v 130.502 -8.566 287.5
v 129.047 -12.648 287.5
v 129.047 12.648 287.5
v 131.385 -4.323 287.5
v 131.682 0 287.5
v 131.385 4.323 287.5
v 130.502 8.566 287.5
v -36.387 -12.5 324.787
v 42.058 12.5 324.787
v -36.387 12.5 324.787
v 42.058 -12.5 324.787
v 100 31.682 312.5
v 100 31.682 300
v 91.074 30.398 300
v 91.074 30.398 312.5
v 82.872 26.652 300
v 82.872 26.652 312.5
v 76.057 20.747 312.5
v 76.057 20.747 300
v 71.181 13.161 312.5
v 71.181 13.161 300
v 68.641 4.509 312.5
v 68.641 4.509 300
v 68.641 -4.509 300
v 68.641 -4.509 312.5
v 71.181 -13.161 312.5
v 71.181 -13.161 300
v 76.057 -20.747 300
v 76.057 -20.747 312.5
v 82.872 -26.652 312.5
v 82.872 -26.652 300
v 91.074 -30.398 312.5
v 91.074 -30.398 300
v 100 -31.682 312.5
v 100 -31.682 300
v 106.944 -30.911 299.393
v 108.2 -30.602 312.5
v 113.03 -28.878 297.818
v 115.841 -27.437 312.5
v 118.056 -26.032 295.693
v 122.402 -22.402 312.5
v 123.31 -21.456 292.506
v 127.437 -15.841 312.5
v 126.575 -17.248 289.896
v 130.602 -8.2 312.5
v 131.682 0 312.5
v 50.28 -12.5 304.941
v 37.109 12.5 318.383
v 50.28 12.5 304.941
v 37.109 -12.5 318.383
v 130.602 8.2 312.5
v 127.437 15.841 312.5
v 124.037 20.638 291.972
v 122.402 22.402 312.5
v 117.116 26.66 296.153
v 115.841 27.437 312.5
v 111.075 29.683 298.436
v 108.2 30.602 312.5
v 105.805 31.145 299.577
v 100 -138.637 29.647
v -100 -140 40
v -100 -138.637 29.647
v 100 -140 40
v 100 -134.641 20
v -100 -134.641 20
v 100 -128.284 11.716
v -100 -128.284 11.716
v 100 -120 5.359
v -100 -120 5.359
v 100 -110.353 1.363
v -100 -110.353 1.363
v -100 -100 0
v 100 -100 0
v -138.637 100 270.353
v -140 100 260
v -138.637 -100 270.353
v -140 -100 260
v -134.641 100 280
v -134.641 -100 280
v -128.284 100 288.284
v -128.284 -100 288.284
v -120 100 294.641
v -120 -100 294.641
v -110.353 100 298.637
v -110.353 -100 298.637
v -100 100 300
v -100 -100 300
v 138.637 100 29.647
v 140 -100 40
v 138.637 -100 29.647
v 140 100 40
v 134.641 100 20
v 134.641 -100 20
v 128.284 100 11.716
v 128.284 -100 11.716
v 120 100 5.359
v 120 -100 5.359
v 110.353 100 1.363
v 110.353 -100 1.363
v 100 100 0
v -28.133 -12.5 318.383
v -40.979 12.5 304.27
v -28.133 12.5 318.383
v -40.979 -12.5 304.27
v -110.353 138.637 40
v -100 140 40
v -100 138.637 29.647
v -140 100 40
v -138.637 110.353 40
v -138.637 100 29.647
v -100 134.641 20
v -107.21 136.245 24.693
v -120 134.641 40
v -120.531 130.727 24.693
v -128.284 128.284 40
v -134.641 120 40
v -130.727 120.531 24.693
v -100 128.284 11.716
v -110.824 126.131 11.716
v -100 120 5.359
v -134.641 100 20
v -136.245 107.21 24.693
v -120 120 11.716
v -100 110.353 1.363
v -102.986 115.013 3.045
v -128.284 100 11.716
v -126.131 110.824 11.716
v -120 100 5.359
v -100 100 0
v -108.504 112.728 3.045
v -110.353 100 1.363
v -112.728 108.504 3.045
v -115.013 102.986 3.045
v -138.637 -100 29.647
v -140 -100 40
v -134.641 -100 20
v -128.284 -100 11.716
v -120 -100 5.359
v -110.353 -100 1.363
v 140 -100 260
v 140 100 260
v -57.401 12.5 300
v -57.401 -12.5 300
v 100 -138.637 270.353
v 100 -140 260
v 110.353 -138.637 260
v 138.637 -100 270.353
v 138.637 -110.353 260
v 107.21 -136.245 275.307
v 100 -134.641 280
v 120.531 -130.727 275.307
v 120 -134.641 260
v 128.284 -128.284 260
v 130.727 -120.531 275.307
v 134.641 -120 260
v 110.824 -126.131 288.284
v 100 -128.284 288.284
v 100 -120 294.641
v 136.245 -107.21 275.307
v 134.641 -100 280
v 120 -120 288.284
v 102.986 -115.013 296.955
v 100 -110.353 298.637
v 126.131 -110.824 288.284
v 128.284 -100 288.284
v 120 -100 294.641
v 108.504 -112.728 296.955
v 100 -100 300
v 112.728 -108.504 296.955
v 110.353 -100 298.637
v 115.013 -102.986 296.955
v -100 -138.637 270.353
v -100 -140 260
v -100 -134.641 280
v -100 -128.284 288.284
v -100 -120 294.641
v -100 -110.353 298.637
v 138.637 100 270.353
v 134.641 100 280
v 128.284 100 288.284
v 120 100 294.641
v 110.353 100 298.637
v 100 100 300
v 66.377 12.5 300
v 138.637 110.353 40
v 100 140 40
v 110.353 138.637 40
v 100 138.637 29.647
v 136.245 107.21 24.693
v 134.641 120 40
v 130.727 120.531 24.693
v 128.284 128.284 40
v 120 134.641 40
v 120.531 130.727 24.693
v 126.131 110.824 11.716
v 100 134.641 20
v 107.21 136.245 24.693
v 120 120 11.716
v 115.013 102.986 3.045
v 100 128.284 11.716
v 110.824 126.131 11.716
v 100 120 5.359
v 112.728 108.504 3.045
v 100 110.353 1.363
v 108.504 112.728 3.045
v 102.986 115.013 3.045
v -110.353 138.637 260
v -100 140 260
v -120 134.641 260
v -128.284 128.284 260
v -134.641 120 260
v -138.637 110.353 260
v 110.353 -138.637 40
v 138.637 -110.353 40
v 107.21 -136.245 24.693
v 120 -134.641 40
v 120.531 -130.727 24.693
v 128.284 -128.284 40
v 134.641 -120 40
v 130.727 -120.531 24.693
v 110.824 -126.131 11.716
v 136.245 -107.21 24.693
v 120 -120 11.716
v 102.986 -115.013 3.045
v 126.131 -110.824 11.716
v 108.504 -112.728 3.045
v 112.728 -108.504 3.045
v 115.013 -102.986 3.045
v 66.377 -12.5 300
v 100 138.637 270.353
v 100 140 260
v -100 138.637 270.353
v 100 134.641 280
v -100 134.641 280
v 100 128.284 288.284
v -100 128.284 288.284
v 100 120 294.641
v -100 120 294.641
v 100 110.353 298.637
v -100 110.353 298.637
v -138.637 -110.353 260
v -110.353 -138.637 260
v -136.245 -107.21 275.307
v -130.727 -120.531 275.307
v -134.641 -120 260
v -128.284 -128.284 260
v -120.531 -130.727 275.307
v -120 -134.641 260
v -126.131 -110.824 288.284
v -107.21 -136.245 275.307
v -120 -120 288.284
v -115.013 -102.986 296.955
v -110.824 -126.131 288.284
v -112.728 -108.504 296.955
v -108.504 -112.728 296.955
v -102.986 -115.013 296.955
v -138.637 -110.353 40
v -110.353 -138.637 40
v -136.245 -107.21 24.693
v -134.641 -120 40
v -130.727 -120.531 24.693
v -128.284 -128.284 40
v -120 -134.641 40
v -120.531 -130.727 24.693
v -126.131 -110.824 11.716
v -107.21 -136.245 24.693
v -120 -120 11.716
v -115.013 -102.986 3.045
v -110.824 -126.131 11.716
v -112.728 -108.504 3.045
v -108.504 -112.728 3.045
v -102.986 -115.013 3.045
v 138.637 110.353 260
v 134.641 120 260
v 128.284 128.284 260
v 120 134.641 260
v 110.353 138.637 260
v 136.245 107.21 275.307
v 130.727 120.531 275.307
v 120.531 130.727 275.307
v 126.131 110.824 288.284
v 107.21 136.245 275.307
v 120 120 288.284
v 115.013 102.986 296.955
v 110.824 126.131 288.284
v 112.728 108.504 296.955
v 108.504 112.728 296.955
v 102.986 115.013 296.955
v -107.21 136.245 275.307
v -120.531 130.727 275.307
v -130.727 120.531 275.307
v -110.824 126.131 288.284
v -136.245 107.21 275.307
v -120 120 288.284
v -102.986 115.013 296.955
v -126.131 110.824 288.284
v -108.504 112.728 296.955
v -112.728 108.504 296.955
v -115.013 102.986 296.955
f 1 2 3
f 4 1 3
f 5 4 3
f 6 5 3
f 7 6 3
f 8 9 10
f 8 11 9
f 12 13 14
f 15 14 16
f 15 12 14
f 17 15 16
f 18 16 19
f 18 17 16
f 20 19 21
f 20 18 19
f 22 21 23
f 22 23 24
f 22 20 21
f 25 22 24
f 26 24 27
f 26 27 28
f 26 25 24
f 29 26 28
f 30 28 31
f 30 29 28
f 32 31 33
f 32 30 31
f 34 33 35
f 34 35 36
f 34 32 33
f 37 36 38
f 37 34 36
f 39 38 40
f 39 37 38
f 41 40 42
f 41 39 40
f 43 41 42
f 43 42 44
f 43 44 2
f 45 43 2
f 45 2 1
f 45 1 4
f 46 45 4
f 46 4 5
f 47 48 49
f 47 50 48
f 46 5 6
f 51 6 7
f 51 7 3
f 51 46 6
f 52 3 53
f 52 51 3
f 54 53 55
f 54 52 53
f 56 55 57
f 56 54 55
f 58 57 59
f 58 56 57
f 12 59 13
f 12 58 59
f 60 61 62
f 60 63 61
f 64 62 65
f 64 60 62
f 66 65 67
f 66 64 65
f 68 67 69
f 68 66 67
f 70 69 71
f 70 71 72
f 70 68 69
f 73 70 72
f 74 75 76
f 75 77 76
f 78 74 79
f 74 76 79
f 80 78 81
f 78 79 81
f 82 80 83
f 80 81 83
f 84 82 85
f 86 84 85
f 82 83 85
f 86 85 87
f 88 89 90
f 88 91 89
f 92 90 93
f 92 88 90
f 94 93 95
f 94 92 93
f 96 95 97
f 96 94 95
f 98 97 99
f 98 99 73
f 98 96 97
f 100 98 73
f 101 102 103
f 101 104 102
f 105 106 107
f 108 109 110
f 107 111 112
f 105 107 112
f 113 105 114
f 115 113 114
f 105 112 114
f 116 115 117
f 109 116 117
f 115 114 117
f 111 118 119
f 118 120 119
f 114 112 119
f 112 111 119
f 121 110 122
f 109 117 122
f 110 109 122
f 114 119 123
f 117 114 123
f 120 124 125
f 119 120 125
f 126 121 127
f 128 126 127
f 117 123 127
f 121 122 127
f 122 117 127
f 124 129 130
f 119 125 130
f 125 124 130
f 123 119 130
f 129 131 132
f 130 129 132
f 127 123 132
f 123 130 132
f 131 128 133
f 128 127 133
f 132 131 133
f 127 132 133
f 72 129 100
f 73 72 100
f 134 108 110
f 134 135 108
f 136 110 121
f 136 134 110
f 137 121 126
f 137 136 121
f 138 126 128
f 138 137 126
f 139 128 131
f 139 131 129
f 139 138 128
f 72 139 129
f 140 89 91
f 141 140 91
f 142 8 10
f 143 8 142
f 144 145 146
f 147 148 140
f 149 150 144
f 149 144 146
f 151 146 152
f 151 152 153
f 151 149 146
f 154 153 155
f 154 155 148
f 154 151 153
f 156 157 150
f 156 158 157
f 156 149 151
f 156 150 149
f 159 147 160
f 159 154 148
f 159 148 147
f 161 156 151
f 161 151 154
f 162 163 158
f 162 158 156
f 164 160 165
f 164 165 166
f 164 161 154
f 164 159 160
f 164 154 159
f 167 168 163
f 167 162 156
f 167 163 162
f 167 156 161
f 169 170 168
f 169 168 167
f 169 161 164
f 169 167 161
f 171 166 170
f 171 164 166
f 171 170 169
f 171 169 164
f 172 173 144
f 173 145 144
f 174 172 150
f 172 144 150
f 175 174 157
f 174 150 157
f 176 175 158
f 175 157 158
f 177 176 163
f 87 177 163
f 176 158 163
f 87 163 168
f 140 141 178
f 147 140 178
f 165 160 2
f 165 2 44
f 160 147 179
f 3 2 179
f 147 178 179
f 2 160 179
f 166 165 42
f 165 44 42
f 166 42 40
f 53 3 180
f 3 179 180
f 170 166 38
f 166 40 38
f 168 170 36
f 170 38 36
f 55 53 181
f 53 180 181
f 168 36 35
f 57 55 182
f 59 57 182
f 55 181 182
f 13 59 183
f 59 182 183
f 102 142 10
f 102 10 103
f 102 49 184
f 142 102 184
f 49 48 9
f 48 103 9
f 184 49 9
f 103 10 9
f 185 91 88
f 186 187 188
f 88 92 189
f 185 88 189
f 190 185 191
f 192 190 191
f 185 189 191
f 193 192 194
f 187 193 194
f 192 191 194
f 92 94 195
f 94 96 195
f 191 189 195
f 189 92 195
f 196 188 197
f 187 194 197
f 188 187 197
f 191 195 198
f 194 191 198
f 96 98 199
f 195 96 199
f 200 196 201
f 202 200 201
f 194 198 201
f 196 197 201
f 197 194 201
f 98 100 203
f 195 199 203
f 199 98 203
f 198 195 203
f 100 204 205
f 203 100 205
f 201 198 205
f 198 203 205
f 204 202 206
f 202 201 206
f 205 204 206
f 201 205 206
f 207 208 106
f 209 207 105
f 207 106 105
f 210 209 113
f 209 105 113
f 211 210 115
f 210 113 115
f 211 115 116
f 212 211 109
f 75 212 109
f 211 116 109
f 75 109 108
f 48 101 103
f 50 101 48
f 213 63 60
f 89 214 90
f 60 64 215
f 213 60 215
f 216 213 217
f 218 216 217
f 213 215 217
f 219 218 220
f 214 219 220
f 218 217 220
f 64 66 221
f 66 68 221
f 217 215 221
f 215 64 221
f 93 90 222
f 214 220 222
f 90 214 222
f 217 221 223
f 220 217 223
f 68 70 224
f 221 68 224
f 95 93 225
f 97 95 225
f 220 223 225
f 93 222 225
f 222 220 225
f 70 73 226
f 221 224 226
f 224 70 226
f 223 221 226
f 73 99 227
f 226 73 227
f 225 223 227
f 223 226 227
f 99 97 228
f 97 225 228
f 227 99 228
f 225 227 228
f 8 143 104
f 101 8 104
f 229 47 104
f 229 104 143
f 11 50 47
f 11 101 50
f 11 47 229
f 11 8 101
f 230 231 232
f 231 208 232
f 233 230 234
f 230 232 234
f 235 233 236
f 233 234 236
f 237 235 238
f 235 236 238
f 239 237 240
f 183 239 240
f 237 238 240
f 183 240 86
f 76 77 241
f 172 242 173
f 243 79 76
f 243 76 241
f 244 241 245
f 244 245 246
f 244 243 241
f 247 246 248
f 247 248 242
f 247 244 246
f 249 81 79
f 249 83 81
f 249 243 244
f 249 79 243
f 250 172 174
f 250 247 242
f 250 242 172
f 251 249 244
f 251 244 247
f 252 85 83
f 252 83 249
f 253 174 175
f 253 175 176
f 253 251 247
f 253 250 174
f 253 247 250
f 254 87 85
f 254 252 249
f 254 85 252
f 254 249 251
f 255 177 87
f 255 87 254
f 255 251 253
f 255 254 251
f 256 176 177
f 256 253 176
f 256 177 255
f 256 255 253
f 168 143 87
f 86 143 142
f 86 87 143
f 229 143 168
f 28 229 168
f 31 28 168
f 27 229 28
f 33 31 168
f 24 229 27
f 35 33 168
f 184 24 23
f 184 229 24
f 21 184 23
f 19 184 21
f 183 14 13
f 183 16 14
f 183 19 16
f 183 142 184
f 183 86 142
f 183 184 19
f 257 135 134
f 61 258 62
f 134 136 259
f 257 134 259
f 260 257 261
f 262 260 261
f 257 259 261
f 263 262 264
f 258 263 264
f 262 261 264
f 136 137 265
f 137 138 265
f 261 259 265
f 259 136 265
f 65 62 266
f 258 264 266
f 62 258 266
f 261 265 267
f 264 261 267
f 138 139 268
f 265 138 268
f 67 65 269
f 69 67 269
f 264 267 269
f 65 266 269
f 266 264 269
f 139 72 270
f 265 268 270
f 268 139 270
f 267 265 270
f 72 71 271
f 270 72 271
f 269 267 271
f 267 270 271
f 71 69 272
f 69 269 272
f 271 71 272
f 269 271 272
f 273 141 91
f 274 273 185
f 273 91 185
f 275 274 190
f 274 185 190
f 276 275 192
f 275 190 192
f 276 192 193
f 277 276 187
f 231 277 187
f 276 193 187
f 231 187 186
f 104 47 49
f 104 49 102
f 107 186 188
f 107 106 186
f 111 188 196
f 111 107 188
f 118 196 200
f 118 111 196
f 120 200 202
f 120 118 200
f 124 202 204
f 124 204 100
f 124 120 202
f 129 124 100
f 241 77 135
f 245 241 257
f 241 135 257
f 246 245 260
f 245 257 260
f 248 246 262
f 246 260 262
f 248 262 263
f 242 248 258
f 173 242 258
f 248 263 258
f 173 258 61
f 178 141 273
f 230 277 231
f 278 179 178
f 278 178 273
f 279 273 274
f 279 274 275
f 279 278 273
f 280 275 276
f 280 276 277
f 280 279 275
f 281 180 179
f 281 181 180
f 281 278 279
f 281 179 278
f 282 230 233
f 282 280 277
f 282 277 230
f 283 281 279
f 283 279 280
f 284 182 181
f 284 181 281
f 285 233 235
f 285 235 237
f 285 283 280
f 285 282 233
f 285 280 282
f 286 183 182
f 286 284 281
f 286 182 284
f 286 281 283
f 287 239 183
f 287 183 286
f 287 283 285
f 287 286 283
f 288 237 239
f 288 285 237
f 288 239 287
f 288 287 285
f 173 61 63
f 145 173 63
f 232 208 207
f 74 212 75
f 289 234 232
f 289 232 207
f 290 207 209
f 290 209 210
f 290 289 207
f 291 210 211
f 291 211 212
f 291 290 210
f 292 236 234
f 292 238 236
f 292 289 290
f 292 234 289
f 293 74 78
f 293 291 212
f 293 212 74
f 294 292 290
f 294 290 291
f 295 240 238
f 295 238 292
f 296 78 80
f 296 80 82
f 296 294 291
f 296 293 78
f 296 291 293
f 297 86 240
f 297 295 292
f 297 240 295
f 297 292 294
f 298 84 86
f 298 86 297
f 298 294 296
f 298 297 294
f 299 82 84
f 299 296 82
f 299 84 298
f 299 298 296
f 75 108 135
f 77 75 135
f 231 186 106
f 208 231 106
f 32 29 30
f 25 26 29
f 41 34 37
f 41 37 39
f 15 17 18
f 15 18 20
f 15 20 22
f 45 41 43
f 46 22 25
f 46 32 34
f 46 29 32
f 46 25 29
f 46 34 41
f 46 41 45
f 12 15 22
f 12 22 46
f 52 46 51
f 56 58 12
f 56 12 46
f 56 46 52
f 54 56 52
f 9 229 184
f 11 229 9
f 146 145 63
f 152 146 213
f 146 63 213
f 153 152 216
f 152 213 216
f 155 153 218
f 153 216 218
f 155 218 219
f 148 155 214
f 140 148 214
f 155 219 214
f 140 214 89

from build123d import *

# Parameters (mm, degrees)
F1_DEPTH = 300
F2_R     = 40
F4_DEPTH = 12.5
F6_DEPTH = 12.5


with BuildPart() as f1:
    # F0 (on Top) → F1 (new body)
    with BuildSketch(Plane.XY):
        with BuildLine():
            ThreePointArc((140, 100), (128.2842712475, 128.2842712475), (100, 140))
            Line((100, 140), (-100, 140))
            ThreePointArc((-100, 140), (-128.2842712475, 128.2842712475), (-140, 100))
            Line((-140, 100), (-140, -100))
            ThreePointArc((-140, -100), (-128.2842712475, -128.2842712475), (-100, -140))
            Line((-100, -140), (100, -140))
            ThreePointArc((100, -140), (128.2842712475, -128.2842712475), (140, -100))
            Line((140, -100), (140, 100))
        make_face()
    extrude(amount=F1_DEPTH)

    # F2
    f2_edges = [f1.edges().sort_by_distance(p)[0] for p in [
        (128.284271, 128.284271, 300),
        (0, 140, 300),
        (-128.284271, 128.284271, 300),
        (-140, 0, 300),
        (-128.284271, -128.284271, 300),
        (0, -140, 300),
        (128.284271, -128.284271, 300),
        (140, 0, 300),
        (140, 0, 0),
    ]]
    fillet(f2_edges, radius=F2_R)

    # F3 (on face) → F4 (join, symmetric)
    with BuildSketch(Plane.XY.offset(300)):
        with BuildLine():
            ThreePointArc((100, -31.6815127242), (122.4022124856, -22.4022124855), (131.6815127242, 0))
            ThreePointArc((131.6815127242, 0), (122.4022124856, 22.4022124855), (100, 31.6815127242))
            Line((100, 31.6815127242), (100, -31.6815127242))
        make_face()
        with BuildLine():
            Line((100, -31.6815127242), (100, 31.6815127242))
            ThreePointArc((100, 31.6815127242), (68.3184872758, 0), (100, -31.6815127242))
        make_face()
    extrude(amount=F4_DEPTH, both=True)

    # F5 (on Front) → F6 (join, symmetric)
    with BuildSketch(Plane.XZ):
        Polygon((-36.387193948, 324.7865736485), (-57.6208606362, 299.7408509254), (66.6310936213, 299.7408509254), (42.0579239726, 324.7865736485), align=None)
        Polygon((50.280045718, 304.940700531), (-40.9793257713, 304.2699992657), (-28.1326603144, 318.3833062649), (37.1089726686, 318.3833062649), align=None, mode=Mode.SUBTRACT)
    extrude(amount=F6_DEPTH, both=True)


solid = f1.part
